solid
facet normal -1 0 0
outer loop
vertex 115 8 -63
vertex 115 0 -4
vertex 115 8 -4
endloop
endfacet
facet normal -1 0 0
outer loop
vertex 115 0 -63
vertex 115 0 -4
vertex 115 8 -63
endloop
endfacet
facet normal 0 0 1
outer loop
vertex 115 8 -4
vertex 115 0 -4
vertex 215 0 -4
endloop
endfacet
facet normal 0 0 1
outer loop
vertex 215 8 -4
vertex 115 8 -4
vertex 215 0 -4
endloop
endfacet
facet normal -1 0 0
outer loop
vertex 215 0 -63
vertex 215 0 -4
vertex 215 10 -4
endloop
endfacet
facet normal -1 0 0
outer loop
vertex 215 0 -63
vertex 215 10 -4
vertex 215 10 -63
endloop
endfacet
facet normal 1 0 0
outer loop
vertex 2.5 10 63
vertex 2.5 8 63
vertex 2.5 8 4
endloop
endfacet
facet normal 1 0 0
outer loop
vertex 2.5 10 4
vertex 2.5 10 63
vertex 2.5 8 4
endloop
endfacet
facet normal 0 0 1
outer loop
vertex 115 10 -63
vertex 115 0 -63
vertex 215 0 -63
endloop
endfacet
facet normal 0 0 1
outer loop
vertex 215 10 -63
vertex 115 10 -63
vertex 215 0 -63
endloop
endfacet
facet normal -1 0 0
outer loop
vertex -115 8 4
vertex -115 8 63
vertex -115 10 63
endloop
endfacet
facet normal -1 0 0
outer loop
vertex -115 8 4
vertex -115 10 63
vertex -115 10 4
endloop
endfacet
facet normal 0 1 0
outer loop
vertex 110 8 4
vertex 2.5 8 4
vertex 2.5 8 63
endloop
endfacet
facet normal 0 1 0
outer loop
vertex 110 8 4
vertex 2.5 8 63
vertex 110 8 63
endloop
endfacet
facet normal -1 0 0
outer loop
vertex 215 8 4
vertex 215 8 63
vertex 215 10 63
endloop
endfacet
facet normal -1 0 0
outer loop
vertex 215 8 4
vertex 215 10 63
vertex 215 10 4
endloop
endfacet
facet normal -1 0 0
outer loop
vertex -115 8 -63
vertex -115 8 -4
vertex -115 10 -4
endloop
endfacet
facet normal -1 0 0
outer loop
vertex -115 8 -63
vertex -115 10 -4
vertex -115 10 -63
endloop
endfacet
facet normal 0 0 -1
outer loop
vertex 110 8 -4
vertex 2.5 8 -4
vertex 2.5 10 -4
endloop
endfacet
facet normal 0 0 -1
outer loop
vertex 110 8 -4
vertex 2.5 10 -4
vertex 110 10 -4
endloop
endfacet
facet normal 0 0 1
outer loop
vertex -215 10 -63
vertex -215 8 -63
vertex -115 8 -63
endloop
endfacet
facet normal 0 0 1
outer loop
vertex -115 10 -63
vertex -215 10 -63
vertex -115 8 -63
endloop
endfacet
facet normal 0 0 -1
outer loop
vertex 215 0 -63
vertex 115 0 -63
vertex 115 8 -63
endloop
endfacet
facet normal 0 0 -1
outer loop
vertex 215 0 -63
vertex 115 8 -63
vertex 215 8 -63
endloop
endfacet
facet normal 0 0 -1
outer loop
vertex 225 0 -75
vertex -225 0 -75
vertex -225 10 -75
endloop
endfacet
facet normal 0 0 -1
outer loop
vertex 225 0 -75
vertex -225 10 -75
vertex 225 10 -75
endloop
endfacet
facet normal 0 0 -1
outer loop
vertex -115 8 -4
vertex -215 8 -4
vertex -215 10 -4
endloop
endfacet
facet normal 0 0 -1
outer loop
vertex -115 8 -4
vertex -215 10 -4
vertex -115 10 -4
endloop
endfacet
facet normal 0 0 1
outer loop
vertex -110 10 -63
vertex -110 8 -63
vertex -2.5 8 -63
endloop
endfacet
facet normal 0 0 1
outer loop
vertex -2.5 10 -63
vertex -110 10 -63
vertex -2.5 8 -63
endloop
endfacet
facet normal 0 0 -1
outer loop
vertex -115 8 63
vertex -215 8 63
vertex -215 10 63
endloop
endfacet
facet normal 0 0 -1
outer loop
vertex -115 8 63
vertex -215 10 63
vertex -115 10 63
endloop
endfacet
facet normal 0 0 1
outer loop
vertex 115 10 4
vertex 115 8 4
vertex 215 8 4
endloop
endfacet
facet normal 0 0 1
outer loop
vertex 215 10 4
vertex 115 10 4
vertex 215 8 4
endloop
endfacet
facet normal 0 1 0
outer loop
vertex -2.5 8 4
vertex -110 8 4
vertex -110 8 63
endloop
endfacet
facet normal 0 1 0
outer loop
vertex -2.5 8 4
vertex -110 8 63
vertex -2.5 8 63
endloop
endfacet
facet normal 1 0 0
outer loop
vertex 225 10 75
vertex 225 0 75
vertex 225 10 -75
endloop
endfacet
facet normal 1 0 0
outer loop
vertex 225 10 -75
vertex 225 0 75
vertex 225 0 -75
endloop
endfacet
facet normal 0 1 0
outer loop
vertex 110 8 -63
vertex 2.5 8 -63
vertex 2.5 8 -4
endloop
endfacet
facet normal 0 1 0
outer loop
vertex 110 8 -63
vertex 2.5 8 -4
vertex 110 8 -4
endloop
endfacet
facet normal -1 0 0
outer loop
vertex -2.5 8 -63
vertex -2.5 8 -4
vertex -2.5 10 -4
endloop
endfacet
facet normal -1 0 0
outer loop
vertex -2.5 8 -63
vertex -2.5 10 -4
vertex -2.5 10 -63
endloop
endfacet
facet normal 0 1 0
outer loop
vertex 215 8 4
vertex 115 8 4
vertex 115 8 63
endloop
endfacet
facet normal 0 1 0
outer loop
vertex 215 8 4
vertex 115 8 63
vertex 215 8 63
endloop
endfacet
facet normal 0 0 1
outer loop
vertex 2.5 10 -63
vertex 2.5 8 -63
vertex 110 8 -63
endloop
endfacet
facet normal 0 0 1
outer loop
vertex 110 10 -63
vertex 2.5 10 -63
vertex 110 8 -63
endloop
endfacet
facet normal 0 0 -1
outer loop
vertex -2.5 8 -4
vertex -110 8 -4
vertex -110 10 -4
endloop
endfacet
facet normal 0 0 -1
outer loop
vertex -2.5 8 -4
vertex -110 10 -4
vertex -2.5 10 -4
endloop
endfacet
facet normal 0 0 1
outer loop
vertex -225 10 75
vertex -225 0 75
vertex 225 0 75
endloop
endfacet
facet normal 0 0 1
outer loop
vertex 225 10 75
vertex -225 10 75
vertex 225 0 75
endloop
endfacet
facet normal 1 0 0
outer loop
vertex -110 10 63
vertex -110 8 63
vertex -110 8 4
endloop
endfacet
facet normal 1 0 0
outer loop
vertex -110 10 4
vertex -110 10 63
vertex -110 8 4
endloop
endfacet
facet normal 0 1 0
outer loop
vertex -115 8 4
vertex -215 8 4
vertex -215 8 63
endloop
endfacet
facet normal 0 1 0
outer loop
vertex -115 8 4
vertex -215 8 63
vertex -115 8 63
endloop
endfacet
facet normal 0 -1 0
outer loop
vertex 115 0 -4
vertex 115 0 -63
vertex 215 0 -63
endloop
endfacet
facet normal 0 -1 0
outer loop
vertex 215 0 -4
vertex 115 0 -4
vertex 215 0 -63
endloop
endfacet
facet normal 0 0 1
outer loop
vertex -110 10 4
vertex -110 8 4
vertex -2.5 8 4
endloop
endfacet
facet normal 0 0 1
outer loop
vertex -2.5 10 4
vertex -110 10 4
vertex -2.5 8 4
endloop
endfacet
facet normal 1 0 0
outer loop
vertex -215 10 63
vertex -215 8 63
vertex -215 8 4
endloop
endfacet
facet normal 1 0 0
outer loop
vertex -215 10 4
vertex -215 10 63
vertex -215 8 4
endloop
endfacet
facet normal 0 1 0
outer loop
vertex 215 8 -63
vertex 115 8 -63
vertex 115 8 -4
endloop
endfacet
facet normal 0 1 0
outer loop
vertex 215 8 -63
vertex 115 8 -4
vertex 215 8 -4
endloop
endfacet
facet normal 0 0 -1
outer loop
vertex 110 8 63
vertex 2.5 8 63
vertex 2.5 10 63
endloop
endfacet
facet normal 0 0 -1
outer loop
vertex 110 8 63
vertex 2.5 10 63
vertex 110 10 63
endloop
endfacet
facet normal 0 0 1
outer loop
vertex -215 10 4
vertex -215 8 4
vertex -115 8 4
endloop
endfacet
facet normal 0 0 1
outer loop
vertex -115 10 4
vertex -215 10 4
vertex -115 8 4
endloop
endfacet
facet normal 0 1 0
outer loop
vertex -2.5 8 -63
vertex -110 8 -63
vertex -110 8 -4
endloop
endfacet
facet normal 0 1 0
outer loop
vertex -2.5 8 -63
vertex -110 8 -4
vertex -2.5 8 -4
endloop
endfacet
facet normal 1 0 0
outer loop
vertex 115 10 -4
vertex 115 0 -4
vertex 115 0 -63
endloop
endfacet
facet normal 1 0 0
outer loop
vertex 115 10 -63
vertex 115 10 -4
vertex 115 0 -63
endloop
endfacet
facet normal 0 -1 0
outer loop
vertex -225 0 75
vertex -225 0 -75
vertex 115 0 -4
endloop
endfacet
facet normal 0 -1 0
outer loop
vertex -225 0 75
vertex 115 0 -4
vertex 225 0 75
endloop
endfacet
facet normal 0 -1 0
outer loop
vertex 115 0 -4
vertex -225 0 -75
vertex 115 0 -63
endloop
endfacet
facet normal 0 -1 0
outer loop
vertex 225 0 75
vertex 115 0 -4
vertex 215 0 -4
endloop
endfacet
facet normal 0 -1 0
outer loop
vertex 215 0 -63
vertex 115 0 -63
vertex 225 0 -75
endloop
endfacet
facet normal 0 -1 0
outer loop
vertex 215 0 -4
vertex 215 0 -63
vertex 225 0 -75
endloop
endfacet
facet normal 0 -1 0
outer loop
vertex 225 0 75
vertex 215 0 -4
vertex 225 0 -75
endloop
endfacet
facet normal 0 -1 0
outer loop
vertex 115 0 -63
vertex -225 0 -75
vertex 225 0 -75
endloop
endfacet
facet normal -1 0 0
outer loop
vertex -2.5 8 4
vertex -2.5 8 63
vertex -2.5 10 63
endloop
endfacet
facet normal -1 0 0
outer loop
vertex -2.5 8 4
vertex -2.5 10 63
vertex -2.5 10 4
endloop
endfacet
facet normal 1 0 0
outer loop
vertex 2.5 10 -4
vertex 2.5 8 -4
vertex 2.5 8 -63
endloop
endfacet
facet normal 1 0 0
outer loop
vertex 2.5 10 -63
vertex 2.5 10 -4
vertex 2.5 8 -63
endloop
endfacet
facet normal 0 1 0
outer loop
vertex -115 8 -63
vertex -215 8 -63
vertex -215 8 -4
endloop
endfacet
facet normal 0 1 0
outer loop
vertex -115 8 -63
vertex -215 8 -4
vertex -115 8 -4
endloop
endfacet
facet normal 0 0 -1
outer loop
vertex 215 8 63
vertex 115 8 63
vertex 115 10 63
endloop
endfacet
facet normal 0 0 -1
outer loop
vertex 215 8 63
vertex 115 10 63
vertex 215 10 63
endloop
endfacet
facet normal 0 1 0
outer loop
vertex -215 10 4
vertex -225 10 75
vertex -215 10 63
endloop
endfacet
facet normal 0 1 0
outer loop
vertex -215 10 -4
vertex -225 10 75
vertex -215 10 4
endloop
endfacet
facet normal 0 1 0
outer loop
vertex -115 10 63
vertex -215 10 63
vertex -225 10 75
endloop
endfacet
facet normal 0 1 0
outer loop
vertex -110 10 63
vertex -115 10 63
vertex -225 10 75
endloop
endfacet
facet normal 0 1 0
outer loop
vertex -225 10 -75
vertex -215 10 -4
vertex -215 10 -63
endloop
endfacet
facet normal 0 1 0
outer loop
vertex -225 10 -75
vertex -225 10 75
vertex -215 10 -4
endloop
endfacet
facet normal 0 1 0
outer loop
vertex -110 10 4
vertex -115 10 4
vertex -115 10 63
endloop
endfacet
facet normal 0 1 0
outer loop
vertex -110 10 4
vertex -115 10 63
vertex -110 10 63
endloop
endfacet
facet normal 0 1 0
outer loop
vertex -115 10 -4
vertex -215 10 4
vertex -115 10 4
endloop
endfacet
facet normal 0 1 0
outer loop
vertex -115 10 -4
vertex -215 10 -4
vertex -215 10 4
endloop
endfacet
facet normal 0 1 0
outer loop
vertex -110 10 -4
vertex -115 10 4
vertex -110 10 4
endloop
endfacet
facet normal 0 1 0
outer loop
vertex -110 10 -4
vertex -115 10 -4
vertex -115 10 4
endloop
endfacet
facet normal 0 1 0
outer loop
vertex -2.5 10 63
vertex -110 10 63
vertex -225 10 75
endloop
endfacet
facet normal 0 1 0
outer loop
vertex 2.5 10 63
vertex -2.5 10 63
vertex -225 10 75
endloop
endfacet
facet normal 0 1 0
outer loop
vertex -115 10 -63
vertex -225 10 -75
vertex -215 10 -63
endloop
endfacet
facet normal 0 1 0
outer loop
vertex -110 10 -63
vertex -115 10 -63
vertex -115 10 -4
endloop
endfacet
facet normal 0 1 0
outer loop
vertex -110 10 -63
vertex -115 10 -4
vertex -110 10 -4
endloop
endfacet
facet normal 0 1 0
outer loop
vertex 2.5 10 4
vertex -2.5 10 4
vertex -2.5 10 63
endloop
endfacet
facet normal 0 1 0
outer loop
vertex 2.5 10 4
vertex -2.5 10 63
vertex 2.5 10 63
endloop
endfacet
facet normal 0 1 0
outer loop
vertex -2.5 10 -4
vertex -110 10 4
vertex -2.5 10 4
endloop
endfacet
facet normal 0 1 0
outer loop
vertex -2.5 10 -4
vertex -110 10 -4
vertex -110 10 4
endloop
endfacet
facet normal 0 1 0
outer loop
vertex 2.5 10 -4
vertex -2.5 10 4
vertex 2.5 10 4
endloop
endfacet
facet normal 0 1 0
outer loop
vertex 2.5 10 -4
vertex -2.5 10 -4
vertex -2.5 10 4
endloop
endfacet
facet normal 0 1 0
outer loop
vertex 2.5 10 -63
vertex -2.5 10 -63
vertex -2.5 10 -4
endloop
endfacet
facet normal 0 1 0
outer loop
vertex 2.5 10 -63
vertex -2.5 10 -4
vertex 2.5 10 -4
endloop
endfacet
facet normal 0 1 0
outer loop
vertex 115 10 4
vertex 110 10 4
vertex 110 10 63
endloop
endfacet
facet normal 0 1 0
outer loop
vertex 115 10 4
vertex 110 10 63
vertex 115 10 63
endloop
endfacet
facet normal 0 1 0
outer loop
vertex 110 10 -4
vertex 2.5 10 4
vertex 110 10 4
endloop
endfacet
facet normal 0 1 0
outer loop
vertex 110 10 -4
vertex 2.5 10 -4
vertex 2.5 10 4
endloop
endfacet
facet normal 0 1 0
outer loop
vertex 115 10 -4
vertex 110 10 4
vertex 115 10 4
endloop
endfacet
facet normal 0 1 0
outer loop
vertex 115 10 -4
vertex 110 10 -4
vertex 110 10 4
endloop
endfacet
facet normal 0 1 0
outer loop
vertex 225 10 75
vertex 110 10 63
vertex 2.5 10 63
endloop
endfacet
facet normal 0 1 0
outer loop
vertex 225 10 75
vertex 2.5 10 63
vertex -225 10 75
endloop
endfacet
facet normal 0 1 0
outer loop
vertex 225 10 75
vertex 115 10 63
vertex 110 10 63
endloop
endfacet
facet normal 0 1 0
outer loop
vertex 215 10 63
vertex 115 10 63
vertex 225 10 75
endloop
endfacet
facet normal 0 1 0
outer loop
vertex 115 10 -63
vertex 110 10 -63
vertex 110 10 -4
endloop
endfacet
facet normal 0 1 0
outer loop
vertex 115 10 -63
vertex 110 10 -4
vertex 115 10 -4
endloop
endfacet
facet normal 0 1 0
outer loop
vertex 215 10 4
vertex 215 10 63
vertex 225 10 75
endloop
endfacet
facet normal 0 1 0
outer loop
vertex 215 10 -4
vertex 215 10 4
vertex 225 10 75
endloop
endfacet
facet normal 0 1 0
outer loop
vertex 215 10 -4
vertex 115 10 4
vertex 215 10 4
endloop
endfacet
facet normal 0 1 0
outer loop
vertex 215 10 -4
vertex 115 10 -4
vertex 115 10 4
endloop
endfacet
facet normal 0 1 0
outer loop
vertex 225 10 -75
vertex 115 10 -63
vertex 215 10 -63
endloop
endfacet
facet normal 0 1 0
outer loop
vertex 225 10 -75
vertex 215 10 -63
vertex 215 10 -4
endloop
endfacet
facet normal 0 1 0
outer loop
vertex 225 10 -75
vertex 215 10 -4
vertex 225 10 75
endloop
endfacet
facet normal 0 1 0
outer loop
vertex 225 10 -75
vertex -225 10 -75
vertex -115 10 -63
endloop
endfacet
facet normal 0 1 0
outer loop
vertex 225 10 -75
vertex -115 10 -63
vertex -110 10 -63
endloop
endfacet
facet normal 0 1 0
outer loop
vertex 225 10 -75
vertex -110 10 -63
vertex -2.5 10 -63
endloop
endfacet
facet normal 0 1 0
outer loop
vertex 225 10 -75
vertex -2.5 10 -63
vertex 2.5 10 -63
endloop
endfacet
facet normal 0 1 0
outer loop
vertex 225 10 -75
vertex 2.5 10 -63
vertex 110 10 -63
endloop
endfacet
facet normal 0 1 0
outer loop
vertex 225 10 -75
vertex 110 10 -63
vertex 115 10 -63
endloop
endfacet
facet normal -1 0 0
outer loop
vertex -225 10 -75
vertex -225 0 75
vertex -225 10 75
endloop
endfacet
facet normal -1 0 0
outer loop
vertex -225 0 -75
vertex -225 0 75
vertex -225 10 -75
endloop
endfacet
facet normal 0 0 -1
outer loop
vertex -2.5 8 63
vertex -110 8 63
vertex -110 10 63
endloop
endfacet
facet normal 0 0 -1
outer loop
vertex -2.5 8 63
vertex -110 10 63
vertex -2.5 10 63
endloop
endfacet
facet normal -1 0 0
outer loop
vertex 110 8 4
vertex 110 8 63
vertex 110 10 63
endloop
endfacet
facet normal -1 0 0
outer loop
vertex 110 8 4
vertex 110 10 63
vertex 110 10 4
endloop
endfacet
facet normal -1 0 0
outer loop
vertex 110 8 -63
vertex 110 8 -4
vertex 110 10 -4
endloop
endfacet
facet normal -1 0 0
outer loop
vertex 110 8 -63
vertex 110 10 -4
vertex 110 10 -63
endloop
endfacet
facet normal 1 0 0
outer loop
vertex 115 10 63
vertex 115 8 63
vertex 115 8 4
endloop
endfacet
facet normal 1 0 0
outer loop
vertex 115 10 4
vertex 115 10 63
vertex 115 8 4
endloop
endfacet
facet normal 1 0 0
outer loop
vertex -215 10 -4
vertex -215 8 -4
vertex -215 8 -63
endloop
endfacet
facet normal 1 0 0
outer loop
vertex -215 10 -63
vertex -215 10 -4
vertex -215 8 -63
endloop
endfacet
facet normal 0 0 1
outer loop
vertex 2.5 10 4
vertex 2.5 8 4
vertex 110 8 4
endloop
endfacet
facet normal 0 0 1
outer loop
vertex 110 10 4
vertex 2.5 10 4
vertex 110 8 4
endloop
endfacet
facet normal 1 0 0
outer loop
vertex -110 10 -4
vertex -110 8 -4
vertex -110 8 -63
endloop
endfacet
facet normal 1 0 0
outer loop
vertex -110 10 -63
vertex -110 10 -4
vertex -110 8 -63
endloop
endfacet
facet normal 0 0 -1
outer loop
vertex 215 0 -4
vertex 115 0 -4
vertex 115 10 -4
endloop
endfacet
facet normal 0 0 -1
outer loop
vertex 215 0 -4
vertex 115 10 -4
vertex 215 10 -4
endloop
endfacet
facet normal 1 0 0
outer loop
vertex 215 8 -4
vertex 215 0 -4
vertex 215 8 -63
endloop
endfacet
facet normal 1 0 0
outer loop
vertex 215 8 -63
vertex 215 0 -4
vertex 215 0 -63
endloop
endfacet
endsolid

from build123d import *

# Parameters (mm, degrees)
SKETCH1_W             = 100
SKETCH1_H             = 59
BOSS_EXTRUDE1_DEPTH   = 8
SKETCH1_W_2           = 107.5
BOSS_EXTRUDE1_2_DEPTH = 8
BOSS_EXTRUDE1_3_DEPTH = 8
BOSS_EXTRUDE1_4_DEPTH = 8
BOSS_EXTRUDE1_5_DEPTH = 8
BOSS_EXTRUDE1_6_DEPTH = 8
BOSS_EXTRUDE1_7_DEPTH = 8
BOSS_EXTRUDE1_8_DEPTH = 8
SKETCH1_3_W           = 450
SKETCH1_3_H           = 150
SKETCH1_3_W_2         = 100
SKETCH1_3_H_2         = 59
SKETCH1_3_W_3         = 107.5
BOSS_EXTRUDE2_DEPTH   = 10


with BuildPart() as part:
    # Sketch1 → Boss-Extrude1 (new body)
    with BuildSketch(Plane(origin=(0, 0, 0), x_dir=(1, 0, 0), z_dir=(0, 1, 0))):
        with Locations((-165, 33.5)):
            Rectangle(SKETCH1_W, SKETCH1_H)
    extrude(amount=BOSS_EXTRUDE1_DEPTH)



with BuildPart() as body_2:
    # Sketch1 → Boss-Extrude1 2 (new body)
    with BuildSketch(Plane(origin=(0, 0, 0), x_dir=(1, 0, 0), z_dir=(0, 1, 0))):
        with Locations((-56.25, 33.5)):
            Rectangle(SKETCH1_W_2, SKETCH1_H)
    extrude(amount=BOSS_EXTRUDE1_2_DEPTH)


with BuildPart() as body_3:
    # Sketch1 → Boss-Extrude1 3 (new body)
    with BuildSketch(Plane(origin=(0, 0, 0), x_dir=(1, 0, 0), z_dir=(0, 1, 0))):
        with Locations((-165, -33.5)):
            Rectangle(SKETCH1_W, SKETCH1_H)
    extrude(amount=BOSS_EXTRUDE1_3_DEPTH)


with BuildPart() as body_4:
    # Sketch1 → Boss-Extrude1 4 (new body)
    with BuildSketch(Plane(origin=(0, 0, 0), x_dir=(1, 0, 0), z_dir=(0, 1, 0))):
        with Locations((56.25, 33.5)):
            Rectangle(SKETCH1_W_2, SKETCH1_H)
    extrude(amount=BOSS_EXTRUDE1_4_DEPTH)


with BuildPart() as body_5:
    # Sketch1 → Boss-Extrude1 5 (new body)
    with BuildSketch(Plane(origin=(0, 0, 0), x_dir=(1, 0, 0), z_dir=(0, 1, 0))):
        with Locations((-56.25, -33.5)):
            Rectangle(SKETCH1_W_2, SKETCH1_H)
    extrude(amount=BOSS_EXTRUDE1_5_DEPTH)


with BuildPart() as body_6:
    # Sketch1 → Boss-Extrude1 6 (new body)
    with BuildSketch(Plane(origin=(0, 0, 0), x_dir=(1, 0, 0), z_dir=(0, 1, 0))):
        with Locations((165, 33.5)):
            Rectangle(SKETCH1_W, SKETCH1_H)
    extrude(amount=BOSS_EXTRUDE1_6_DEPTH)


with BuildPart() as body_7:
    # Sketch1 → Boss-Extrude1 7 (new body)
    with BuildSketch(Plane(origin=(0, 0, 0), x_dir=(1, 0, 0), z_dir=(0, 1, 0))):
        with Locations((56.25, -33.5)):
            Rectangle(SKETCH1_W_2, SKETCH1_H)
    extrude(amount=BOSS_EXTRUDE1_7_DEPTH)


with BuildPart() as body_8:
    # Sketch1 → Boss-Extrude1 8 (new body)
    with BuildSketch(Plane(origin=(0, 0, 0), x_dir=(1, 0, 0), z_dir=(0, 1, 0))):
        with Locations((165, -33.5)):
            Rectangle(SKETCH1_W, SKETCH1_H)
    extrude(amount=BOSS_EXTRUDE1_8_DEPTH)


with BuildPart() as part_1:
    add(part.part)

    add(body_3.part)  # Boss-Extrude2 merges body 3

    add(body_2.part)  # Boss-Extrude2 merges body 2

    add(body_5.part)  # Boss-Extrude2 merges body 5

    add(body_4.part)  # Boss-Extrude2 merges body 4

    add(body_7.part)  # Boss-Extrude2 merges body 7

    add(body_8.part)  # Boss-Extrude2 merges body 8
    # Sketch1<3> → Boss-Extrude2 (add)
    with BuildSketch(Plane(origin=(0, 0, 0), x_dir=(1, 0, 0), z_dir=(0, 1, 0))):
        Rectangle(SKETCH1_3_W, SKETCH1_3_H)
        with Locations((-165, 33.5)):
            Rectangle(SKETCH1_3_W_2, SKETCH1_3_H_2, mode=Mode.SUBTRACT)
        with Locations((-56.25, 33.5)):
            Rectangle(SKETCH1_3_W_3, SKETCH1_3_H_2, mode=Mode.SUBTRACT)
        with Locations((-165, -33.5)):
            Rectangle(SKETCH1_3_W_2, SKETCH1_3_H_2, mode=Mode.SUBTRACT)
        with Locations((56.25, 33.5)):
            Rectangle(SKETCH1_3_W_3, SKETCH1_3_H_2, mode=Mode.SUBTRACT)
        with Locations((-56.25, -33.5)):
            Rectangle(SKETCH1_3_W_3, SKETCH1_3_H_2, mode=Mode.SUBTRACT)
        with Locations((165, 33.5)):
            Rectangle(SKETCH1_3_W_2, SKETCH1_3_H_2, mode=Mode.SUBTRACT)
        with Locations((56.25, -33.5)):
            Rectangle(SKETCH1_3_W_3, SKETCH1_3_H_2, mode=Mode.SUBTRACT)
        with Locations((165, -33.5)):
            Rectangle(SKETCH1_3_W_2, SKETCH1_3_H_2, mode=Mode.SUBTRACT)
    extrude(amount=BOSS_EXTRUDE2_DEPTH)


solid = Compound([body_6.part, part_1.part])
